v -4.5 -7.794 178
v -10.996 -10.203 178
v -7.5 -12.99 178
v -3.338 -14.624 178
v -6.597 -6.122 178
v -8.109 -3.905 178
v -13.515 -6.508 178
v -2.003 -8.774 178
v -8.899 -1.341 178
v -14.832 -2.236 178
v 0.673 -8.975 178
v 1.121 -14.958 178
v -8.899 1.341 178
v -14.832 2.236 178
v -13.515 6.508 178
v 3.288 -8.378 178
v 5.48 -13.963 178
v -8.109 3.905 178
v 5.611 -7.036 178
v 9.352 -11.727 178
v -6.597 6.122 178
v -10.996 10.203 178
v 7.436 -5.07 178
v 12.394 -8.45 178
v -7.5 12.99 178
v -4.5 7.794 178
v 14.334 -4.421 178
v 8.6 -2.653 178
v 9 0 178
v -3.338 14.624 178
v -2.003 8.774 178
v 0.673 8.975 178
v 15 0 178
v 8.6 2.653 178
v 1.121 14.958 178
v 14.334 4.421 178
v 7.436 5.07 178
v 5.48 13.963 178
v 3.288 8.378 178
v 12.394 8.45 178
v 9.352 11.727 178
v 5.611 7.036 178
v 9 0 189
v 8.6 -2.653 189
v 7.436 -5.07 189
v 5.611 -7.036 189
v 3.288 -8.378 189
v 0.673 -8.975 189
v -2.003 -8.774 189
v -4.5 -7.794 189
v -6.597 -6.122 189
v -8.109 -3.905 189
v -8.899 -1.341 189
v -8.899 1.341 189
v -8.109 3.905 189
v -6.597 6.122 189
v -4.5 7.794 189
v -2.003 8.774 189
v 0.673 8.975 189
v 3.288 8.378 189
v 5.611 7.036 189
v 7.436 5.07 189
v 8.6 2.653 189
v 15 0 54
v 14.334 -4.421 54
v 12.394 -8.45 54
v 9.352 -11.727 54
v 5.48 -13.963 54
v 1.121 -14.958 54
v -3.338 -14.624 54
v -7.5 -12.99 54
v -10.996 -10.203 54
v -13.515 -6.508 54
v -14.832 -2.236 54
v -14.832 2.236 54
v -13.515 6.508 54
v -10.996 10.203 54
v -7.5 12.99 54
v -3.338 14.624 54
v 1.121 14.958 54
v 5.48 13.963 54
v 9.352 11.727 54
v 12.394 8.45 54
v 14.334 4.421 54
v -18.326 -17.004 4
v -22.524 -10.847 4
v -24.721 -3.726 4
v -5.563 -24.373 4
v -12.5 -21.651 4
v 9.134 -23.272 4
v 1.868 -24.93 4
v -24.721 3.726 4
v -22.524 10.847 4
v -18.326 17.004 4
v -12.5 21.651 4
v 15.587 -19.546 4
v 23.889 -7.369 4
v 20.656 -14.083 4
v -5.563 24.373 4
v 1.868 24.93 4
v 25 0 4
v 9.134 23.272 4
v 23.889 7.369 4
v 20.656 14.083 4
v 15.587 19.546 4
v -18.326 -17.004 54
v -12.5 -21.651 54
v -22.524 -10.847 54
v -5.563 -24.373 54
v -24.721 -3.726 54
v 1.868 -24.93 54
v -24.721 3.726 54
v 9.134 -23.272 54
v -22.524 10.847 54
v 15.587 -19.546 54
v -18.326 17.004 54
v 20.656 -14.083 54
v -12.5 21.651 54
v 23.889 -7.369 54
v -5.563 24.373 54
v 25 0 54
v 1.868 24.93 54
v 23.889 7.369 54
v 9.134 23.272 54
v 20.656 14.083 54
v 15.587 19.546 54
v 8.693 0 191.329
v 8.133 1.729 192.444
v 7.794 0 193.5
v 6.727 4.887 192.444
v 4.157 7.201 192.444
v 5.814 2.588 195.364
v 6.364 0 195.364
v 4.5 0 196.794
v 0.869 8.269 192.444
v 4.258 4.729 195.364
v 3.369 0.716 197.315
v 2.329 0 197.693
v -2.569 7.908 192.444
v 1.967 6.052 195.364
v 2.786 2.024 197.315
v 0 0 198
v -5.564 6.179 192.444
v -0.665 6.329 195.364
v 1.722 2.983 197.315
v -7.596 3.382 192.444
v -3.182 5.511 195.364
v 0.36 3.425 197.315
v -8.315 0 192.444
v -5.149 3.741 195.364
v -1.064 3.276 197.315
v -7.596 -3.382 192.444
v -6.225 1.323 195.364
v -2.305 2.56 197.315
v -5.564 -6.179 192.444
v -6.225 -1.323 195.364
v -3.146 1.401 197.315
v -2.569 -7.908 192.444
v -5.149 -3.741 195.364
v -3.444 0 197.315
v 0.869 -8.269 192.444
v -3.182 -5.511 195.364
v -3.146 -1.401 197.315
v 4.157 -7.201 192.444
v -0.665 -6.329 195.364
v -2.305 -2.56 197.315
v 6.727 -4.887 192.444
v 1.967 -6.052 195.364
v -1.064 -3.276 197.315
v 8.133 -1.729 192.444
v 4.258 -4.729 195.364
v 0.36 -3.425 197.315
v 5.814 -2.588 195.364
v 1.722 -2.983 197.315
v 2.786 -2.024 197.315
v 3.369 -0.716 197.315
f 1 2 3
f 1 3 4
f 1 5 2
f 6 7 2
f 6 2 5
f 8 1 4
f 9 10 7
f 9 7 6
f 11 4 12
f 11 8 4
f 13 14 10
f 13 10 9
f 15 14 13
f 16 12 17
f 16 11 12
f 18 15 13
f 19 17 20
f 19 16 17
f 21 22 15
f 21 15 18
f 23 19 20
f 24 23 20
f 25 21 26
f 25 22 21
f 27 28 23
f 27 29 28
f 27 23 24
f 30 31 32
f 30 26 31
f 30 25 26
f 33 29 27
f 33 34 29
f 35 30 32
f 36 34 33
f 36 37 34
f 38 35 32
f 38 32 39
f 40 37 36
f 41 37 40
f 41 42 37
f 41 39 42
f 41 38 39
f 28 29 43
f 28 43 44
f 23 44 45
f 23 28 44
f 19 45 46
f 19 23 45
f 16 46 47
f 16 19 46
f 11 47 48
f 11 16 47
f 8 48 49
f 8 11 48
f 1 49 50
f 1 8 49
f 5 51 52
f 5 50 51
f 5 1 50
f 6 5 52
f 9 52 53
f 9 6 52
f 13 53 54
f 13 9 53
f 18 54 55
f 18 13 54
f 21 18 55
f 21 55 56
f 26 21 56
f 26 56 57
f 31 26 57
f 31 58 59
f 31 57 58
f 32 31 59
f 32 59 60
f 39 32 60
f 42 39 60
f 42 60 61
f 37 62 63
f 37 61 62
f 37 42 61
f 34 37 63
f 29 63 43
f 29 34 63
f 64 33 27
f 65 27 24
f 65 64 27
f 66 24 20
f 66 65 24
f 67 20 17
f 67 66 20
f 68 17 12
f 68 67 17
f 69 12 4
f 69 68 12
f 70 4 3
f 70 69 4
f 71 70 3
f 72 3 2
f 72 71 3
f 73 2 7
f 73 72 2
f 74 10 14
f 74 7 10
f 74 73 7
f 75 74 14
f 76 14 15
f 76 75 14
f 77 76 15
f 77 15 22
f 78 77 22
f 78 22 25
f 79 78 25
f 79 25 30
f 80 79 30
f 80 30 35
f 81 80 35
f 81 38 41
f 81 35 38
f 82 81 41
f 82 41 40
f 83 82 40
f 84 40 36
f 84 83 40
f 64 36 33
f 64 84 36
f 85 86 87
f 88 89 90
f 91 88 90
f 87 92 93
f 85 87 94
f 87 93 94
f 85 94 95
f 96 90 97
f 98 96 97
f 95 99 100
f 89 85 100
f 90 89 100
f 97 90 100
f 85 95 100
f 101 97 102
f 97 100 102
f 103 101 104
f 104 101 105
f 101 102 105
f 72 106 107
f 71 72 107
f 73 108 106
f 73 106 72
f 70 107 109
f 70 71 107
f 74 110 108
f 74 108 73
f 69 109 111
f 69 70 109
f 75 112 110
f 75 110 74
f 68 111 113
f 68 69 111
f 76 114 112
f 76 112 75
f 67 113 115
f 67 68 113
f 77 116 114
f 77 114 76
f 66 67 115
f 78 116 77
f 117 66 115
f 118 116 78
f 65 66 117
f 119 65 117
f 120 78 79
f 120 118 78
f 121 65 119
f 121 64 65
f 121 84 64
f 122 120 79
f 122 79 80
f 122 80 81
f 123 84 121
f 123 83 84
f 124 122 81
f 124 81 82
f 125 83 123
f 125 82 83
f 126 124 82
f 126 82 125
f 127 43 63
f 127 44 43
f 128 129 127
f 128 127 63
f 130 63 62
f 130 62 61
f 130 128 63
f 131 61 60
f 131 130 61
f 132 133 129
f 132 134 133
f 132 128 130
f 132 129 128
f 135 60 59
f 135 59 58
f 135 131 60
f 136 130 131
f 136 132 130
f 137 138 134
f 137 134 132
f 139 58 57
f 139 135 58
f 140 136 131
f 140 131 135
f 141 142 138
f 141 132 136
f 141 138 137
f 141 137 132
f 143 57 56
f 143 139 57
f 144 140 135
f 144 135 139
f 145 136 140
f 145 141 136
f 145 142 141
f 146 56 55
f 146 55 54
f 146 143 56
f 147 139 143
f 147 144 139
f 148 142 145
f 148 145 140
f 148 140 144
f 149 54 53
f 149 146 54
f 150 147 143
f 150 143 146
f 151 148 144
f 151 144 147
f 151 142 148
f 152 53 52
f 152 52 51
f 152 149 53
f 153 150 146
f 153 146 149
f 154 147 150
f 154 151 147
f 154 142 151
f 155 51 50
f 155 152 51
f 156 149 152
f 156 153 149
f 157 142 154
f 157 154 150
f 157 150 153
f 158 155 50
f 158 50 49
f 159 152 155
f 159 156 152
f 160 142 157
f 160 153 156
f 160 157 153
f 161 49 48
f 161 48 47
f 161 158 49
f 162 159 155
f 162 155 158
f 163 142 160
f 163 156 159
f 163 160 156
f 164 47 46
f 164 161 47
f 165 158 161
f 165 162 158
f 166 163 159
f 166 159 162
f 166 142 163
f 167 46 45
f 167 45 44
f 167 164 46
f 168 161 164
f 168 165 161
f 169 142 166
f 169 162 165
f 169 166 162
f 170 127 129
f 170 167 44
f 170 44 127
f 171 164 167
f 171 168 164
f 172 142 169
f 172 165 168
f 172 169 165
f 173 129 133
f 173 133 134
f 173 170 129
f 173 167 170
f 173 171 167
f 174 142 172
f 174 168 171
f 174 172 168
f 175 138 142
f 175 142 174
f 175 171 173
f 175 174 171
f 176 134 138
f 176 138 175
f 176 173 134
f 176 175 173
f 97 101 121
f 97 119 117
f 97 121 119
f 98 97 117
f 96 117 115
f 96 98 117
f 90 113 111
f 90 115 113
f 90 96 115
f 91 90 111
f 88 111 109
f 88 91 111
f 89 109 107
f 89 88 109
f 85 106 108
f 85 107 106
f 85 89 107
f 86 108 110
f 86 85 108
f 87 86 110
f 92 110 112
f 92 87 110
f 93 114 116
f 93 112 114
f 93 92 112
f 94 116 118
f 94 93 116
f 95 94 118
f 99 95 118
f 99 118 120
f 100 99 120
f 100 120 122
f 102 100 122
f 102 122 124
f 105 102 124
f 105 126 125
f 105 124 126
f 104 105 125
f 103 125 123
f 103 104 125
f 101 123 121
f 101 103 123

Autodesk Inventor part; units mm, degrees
ref_plane "YZ Plane" through (0, 0, 0) normal (1, 0, 0) x (0, 1, 0)
ref_plane "Work Plane1" through (0, 0, 4) normal (0, 0, 1) x (1, 0, 0)
sketch "Sketch2" plane through (0, 0, 4) normal (0, 0, 1) x (1, 0, 0)
  circle A0 centre (0, 0) radius 300 projected
  circle A1 centre (0, 0) radius 25
  circle A2 centre (0, 0) radius 15
  dimension "d3" = 50
  dimension "d4" = 30
extrude "Extrusion2" add sketch "Sketch2" along normal blind 50 contours A1 | A2
extrude "Extrusion3" add sketch "Sketch2" along normal blind 174 contours A2
ref_plane "Work Plane3" through (0, 0, 178) normal (0, 0, 1) x (1, 0, 0)
sketch "Sketch3" plane through (0, 0, 178) normal (0, 0, 1) x (1, 0, 0)
  circle A0 centre (0, 0) radius 15 projected
  circle A1 centre (0, 0) radius 9
  dimension "d9" = 18
extrude "Extrusion4" add sketch "Sketch3" along normal blind 20 contours A1
ref_plane "Work Plane2" through (0, 0, 4) normal (0, 0, 1) x (1, 0, 0)
sketch "Sketch4" plane through (0, 0, 4) normal (0, 0, 1) x (1, 0, 0)
  circle A0 centre (0, 0) radius 25 projected
  circle A1 centre (0, 0) radius 300 projected
  line L0 (0, 0) -> (0, 300)
  line L1 (0, 0) -> (0, -300)
  line L2 (0, 0) -> (300, 0)
fillet "Fillet2" radius 9 1 edges at (-9, 0, 198)
properties part number "Lilin"
